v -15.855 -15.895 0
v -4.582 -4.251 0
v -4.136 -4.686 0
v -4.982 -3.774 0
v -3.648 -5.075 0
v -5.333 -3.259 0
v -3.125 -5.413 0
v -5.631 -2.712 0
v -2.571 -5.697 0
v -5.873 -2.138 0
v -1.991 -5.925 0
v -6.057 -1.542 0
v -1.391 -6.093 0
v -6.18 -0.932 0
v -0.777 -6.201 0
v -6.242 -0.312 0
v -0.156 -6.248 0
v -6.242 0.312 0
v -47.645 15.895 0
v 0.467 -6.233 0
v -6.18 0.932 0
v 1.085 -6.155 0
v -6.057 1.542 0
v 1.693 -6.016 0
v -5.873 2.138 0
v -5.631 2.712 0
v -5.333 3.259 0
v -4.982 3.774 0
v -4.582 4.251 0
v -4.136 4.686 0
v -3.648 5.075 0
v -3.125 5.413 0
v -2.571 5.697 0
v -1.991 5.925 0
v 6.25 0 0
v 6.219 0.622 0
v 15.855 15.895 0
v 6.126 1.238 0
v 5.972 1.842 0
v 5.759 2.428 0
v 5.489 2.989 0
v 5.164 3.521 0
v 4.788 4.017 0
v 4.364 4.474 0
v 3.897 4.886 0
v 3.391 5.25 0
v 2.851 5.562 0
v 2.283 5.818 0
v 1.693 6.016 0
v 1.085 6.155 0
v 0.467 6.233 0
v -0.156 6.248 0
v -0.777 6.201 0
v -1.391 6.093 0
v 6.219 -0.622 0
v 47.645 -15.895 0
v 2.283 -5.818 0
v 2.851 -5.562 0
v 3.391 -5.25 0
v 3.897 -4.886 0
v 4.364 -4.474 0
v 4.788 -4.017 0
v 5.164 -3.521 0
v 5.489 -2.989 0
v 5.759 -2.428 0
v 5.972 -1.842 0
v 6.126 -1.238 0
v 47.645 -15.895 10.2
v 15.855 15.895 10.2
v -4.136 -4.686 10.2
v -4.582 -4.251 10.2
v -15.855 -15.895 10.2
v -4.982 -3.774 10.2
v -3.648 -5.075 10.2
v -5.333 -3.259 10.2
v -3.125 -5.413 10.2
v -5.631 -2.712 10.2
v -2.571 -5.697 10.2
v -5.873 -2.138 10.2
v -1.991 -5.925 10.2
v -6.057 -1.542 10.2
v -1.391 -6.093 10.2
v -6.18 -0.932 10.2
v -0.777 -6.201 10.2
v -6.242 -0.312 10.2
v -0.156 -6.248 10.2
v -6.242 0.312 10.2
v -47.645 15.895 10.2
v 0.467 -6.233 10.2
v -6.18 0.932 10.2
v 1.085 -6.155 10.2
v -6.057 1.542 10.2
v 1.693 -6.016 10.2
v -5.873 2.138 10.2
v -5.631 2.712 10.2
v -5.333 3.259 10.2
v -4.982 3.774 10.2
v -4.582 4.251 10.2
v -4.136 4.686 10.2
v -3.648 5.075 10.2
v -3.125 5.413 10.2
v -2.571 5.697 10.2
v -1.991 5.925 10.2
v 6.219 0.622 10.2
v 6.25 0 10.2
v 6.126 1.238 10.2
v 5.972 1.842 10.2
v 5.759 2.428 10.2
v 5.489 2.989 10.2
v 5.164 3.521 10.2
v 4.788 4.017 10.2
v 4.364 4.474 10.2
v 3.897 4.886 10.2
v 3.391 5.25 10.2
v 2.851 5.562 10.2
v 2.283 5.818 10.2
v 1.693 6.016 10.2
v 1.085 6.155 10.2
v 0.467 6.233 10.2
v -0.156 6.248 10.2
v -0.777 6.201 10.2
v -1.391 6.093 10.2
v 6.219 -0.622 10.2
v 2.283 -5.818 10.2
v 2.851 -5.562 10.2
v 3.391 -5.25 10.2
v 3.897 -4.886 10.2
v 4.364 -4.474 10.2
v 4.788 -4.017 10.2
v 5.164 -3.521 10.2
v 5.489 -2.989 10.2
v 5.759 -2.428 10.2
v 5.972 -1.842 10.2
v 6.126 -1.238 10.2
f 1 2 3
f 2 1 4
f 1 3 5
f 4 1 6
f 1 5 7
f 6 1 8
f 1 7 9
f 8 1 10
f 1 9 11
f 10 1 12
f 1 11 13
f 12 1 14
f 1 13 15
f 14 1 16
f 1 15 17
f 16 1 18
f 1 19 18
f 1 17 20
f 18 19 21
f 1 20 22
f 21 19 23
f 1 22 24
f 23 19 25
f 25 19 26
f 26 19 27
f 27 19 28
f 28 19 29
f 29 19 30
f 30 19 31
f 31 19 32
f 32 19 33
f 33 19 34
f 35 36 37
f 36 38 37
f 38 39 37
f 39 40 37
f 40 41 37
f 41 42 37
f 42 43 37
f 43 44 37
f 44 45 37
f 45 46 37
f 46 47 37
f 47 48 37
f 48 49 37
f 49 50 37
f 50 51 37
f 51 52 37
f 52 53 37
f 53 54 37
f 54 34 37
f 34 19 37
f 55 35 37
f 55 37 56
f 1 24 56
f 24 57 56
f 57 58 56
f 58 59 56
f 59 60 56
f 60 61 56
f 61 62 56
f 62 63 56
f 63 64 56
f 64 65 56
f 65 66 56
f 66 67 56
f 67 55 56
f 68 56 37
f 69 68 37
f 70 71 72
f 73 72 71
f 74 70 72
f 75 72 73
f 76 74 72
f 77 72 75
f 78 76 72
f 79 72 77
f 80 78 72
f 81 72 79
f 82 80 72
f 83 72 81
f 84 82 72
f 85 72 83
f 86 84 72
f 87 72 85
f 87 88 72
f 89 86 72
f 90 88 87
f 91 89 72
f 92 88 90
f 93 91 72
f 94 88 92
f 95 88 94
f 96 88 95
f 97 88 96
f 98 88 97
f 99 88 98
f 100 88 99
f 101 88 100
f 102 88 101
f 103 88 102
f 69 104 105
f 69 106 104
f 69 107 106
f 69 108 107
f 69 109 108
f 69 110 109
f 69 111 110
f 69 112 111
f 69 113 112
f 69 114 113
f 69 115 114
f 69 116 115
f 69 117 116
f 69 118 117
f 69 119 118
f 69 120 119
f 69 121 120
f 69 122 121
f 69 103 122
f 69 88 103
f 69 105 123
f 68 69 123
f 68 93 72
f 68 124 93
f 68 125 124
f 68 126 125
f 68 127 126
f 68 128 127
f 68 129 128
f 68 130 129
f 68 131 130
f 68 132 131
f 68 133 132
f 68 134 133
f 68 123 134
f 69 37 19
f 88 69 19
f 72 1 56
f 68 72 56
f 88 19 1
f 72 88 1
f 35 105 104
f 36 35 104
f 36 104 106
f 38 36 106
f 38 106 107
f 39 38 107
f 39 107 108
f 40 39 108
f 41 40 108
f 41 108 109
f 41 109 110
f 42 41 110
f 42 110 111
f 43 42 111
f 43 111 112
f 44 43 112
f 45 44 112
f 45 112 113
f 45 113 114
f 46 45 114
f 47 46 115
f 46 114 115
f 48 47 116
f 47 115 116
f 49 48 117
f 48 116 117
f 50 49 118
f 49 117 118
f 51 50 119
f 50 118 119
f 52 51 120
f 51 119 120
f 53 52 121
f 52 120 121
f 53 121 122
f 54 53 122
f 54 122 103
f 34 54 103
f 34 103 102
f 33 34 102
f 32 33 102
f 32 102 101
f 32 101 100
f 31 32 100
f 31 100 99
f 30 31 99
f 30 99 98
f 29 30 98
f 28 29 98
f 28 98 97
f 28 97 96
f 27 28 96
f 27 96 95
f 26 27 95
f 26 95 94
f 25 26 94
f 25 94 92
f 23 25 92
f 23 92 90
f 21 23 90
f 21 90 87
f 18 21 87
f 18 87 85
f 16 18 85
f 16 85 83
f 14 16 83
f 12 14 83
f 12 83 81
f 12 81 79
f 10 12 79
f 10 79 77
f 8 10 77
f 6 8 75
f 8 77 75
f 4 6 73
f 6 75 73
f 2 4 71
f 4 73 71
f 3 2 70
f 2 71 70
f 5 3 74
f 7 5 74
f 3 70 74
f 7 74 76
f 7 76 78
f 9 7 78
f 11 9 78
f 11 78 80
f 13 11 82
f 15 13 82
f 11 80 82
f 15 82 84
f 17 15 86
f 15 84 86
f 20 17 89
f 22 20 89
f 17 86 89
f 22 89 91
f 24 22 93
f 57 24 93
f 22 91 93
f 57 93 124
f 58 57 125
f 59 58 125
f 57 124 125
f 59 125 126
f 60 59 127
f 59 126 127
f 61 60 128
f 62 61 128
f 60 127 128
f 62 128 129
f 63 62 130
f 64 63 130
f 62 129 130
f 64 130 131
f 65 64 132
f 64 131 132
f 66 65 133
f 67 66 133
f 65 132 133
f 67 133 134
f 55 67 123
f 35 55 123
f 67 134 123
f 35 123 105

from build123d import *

# Parameters (mm, degrees)
F1_DEPTH = 10.2
F2_R     = 6.25
F3_DEPTH = 10.201


with BuildPart() as f1:
    # F0 (on Top) → F1 (new body)
    with BuildSketch(Plane.XY):
        Polygon((15.854947, 15.895053), (-47.645053, 15.895053), (-15.854947, -15.895053), (47.645053, -15.895053), align=None)
    extrude(amount=F1_DEPTH)

    # F2 (on face) → F3 (cut, through all)
    with BuildSketch(Plane.XY.offset(10.2)):
        Circle(F2_R)
    extrude(amount=-F3_DEPTH, mode=Mode.SUBTRACT)


solid = f1.part
